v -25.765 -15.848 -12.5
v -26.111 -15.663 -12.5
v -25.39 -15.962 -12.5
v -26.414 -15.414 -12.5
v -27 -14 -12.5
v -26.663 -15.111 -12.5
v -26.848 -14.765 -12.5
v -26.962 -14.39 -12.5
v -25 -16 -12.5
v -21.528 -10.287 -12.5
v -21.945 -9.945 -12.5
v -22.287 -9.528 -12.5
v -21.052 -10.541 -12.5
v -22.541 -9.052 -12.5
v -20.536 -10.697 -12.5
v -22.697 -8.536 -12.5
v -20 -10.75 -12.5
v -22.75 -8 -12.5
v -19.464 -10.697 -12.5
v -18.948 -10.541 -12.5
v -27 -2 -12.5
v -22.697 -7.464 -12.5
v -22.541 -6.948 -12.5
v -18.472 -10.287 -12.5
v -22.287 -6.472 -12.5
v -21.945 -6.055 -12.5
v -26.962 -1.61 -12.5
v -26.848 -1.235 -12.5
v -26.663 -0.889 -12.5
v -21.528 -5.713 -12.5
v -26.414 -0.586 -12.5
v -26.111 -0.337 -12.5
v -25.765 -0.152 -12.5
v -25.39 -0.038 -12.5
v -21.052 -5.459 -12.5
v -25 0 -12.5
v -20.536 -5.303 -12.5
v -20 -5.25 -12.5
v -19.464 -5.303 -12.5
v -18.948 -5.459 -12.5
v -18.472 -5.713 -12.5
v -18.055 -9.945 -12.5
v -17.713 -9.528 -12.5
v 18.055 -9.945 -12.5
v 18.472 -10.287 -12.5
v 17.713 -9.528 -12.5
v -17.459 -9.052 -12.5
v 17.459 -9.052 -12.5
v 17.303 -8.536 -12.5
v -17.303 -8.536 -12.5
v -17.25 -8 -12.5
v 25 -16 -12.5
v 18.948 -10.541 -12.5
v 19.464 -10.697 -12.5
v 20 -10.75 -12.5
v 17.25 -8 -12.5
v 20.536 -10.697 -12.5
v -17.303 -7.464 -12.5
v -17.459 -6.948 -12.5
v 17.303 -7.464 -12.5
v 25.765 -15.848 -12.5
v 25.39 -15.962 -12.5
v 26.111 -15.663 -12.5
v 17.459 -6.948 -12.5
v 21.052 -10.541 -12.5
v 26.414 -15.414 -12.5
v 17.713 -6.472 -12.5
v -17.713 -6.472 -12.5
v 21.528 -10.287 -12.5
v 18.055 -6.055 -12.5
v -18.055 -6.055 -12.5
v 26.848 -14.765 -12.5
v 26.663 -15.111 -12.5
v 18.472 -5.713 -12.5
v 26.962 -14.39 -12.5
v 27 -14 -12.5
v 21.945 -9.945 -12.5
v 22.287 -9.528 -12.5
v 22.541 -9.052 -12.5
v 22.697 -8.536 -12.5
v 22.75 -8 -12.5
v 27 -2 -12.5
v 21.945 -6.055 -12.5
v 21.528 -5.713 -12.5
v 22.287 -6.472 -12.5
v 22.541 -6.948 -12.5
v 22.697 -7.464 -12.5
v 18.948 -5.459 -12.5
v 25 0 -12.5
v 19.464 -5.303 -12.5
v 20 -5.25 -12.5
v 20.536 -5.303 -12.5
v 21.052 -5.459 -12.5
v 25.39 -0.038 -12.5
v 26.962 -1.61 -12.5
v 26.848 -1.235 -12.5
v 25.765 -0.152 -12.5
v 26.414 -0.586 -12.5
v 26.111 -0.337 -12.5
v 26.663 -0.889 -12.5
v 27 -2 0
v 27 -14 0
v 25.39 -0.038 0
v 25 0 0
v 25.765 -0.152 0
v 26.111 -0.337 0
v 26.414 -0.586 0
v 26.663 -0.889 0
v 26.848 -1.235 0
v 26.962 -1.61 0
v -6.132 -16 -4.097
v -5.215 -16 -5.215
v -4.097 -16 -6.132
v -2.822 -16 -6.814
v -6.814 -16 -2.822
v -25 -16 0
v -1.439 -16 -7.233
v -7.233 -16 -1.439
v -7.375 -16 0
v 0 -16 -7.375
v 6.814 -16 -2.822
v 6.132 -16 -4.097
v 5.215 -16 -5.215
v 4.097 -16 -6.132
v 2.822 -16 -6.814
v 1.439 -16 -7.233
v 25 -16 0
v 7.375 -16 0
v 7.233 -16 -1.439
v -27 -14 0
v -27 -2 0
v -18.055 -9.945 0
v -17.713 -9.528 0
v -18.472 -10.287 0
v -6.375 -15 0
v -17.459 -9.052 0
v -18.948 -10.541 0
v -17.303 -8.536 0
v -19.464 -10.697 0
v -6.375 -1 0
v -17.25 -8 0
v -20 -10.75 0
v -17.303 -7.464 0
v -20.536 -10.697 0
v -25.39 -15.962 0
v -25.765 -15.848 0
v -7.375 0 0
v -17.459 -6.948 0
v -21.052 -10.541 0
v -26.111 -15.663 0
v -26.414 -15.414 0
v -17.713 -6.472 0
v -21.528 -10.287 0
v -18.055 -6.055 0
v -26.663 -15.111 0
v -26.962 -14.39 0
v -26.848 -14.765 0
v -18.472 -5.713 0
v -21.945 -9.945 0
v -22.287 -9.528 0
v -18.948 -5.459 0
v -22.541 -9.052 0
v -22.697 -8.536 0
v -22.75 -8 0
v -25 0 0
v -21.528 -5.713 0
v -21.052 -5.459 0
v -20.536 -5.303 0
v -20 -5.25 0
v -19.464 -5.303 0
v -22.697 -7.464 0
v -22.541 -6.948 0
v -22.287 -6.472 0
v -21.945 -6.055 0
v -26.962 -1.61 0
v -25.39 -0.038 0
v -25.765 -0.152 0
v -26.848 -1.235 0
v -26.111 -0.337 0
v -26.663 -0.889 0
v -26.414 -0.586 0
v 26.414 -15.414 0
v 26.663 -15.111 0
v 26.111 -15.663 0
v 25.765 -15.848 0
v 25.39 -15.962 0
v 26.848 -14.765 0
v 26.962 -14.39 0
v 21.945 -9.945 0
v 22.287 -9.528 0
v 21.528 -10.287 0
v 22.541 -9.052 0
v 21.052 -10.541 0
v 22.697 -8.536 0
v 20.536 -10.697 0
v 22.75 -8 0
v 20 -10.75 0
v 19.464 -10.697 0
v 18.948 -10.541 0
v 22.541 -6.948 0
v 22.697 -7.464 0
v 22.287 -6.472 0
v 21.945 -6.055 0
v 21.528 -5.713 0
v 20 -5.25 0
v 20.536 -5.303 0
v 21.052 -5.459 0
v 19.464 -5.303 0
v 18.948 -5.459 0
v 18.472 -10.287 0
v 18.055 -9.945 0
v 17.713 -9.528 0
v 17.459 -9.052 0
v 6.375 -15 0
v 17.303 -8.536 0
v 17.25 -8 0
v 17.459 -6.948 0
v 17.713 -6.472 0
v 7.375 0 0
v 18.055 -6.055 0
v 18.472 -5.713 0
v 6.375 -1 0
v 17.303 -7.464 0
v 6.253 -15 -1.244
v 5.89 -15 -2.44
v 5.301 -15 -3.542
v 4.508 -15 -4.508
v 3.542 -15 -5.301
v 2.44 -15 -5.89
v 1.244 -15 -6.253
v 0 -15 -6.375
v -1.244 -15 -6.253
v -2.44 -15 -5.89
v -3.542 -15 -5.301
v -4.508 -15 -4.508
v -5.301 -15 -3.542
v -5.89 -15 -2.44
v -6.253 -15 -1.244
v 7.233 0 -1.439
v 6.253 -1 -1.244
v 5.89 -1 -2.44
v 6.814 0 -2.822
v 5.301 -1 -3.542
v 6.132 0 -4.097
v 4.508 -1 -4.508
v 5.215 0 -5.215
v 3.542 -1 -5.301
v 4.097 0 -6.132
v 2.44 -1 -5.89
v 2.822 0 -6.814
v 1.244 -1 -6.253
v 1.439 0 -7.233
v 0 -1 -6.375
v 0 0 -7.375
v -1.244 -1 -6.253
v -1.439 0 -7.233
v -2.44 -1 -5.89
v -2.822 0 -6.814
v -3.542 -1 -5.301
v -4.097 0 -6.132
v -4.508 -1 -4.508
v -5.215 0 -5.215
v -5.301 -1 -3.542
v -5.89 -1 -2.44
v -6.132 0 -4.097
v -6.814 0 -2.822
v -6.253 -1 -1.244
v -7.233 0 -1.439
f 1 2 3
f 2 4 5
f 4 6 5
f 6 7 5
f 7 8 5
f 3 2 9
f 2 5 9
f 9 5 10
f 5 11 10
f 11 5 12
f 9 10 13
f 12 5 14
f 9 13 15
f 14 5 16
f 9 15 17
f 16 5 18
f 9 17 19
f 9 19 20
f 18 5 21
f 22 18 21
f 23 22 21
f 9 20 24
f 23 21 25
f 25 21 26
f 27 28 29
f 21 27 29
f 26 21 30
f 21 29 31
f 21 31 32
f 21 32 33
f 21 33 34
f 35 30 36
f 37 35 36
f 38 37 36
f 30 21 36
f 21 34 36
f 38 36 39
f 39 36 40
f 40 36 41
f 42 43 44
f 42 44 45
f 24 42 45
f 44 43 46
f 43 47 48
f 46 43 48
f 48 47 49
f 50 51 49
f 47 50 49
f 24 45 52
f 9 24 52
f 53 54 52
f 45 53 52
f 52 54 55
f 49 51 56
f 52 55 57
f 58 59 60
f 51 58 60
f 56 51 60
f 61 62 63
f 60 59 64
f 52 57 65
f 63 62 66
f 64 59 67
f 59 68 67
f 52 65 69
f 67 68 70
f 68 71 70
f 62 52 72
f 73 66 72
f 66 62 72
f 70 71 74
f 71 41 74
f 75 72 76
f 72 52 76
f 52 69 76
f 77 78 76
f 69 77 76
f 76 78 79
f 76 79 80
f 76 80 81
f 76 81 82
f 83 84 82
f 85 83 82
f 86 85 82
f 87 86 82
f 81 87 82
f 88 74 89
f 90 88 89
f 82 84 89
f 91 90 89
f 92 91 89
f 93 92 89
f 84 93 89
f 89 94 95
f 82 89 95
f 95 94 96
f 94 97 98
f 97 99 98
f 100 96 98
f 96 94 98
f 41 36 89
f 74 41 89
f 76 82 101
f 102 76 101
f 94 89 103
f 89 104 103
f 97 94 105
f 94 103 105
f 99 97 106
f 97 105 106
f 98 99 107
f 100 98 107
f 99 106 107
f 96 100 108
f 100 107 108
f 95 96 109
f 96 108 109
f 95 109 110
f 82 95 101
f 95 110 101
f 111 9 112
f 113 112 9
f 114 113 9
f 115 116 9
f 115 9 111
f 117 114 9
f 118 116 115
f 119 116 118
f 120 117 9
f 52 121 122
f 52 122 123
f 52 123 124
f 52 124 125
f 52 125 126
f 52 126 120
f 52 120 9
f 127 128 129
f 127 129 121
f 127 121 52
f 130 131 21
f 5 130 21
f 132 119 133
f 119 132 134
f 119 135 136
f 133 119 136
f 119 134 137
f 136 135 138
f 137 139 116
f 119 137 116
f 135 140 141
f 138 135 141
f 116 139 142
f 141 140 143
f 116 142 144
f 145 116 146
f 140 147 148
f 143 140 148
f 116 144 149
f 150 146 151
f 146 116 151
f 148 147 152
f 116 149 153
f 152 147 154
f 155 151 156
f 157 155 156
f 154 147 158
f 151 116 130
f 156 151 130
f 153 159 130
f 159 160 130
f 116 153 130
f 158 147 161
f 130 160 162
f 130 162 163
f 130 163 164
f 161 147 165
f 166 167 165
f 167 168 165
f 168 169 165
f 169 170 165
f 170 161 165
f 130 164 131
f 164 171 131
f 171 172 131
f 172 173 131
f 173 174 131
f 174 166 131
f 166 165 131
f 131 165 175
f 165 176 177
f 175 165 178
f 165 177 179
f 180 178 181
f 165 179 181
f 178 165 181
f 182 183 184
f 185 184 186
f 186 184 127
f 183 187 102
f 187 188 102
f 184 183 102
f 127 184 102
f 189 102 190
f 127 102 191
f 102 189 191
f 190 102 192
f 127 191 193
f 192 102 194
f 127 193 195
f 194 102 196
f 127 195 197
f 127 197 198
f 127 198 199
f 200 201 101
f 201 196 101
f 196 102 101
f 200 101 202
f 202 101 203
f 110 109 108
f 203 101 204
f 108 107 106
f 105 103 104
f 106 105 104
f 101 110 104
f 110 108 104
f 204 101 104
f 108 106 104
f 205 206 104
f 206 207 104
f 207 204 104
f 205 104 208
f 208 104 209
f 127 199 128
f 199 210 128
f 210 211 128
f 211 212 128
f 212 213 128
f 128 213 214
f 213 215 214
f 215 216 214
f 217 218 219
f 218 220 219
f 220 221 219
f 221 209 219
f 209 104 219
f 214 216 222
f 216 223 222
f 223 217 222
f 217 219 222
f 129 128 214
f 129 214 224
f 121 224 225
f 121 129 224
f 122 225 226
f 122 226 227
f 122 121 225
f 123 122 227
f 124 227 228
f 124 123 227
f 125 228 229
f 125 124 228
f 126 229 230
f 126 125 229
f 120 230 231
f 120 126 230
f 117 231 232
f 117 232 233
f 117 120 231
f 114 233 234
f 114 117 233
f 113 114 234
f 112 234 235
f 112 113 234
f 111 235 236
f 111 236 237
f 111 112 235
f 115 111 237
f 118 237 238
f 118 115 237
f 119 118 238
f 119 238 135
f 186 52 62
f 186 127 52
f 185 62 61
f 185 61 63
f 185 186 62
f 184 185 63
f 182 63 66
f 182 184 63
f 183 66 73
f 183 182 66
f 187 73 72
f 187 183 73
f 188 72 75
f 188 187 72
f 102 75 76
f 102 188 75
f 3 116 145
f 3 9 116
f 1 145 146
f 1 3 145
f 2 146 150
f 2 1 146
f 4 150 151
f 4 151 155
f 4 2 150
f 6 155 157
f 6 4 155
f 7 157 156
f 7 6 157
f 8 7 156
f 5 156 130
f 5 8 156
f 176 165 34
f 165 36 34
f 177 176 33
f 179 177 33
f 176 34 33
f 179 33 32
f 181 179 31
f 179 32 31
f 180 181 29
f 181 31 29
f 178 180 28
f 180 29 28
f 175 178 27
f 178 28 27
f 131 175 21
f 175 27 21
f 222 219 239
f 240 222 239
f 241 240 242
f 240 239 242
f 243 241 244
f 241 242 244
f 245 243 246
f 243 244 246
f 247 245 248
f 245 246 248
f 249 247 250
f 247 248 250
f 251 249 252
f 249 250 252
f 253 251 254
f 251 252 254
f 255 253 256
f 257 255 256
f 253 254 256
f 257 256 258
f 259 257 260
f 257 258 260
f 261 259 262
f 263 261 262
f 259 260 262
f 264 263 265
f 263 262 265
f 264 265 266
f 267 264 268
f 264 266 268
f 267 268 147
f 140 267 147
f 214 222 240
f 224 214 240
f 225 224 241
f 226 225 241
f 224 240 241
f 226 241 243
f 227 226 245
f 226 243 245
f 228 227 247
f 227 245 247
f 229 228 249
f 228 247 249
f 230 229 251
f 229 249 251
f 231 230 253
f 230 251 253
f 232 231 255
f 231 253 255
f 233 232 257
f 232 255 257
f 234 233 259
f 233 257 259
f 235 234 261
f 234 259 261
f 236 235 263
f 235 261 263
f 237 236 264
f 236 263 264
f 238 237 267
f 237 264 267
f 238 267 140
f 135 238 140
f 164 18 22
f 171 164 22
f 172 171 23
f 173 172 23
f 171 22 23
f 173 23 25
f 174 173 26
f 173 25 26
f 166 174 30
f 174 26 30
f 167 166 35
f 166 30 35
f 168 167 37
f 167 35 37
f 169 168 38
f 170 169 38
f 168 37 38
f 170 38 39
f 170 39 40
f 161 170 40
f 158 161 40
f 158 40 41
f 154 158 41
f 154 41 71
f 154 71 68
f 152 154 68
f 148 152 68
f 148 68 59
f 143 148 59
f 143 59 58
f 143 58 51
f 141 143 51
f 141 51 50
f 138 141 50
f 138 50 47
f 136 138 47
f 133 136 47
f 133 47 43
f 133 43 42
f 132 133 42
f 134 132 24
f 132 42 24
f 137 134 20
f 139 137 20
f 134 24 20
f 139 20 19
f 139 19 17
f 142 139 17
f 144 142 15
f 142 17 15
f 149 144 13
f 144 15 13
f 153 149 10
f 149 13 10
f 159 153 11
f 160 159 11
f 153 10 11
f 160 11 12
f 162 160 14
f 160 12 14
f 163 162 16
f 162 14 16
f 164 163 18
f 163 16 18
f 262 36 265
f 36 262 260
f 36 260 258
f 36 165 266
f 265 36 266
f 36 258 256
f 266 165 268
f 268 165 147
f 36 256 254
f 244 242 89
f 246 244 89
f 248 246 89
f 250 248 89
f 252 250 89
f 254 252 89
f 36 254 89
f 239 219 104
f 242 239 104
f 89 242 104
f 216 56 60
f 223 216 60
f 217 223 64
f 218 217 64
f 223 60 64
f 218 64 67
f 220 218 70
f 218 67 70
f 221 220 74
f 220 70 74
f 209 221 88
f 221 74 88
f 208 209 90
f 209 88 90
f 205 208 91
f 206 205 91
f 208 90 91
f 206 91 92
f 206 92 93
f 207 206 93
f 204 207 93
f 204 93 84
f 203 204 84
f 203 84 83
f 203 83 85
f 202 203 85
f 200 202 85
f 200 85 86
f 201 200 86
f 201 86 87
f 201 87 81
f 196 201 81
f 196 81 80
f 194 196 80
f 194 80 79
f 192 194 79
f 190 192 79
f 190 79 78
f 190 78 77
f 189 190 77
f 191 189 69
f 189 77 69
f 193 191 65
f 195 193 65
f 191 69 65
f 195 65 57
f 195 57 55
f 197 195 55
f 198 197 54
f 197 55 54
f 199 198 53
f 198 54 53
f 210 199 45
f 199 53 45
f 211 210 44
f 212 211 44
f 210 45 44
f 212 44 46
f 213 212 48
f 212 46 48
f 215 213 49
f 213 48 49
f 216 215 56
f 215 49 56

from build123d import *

# Parameters (mm, degrees)
F1_DEPTH = 16
F3_DEPTH = 12.501
F4_SIZE  = 1
F5_R     = 2


with BuildPart() as f1:
    # F0 (on Front) → F1 (new body)
    with BuildSketch(Plane.XZ):
        with BuildLine():
            Line((-6.375, 0), (-27, 0))
            Line((-27, 0), (-27, -12.5))
            Line((-27, -12.5), (27, -12.5))
            Line((27, -12.5), (27, 0))
            Line((27, 0), (6.375, 0))
            ThreePointArc((6.375, 0), (0, -6.375), (-6.375, 0))
        make_face()
    extrude(amount=F1_DEPTH)

    # F2 (on face) → F3 (cut, through all)
    with BuildSketch(Plane(origin=(0, 0, -12.5), x_dir=(1, 0, 0), z_dir=(0, 0, -1))):
        with BuildLine():
            Line((-22.75, 8), (-17.25, 8))
            ThreePointArc((-17.25, 8), (-20, 10.75), (-22.75, 8))
        make_face()
        with BuildLine():
            ThreePointArc((-22.75, 8), (-20, 5.25), (-17.25, 8))
            Line((-17.25, 8), (-22.75, 8))
        make_face()
        with BuildLine():
            ThreePointArc((22.75, 8), (20, 10.75), (17.25, 8))
            Line((17.25, 8), (22.75, 8))
        make_face()
        with BuildLine():
            Line((22.75, 8), (17.25, 8))
            ThreePointArc((17.25, 8), (20, 5.25), (22.75, 8))
        make_face()
    extrude(amount=-F3_DEPTH, mode=Mode.SUBTRACT)

    # F4
    f4_edges = [f1.edges().sort_by_distance(p)[0] for p in [
        (0, -16, -6.375),
        (0, 0, -6.375),
    ]]
    chamfer(f4_edges, length=F4_SIZE)

    # F5
    f5_edges = [f1.edges().sort_by_distance(p)[0] for p in [
        (-27, -16, -6.25),
        (27, -16, -6.25),
        (27, 0, -6.25),
        (-27, 0, -6.25),
    ]]
    fillet(f5_edges, radius=F5_R)


solid = f1.part
